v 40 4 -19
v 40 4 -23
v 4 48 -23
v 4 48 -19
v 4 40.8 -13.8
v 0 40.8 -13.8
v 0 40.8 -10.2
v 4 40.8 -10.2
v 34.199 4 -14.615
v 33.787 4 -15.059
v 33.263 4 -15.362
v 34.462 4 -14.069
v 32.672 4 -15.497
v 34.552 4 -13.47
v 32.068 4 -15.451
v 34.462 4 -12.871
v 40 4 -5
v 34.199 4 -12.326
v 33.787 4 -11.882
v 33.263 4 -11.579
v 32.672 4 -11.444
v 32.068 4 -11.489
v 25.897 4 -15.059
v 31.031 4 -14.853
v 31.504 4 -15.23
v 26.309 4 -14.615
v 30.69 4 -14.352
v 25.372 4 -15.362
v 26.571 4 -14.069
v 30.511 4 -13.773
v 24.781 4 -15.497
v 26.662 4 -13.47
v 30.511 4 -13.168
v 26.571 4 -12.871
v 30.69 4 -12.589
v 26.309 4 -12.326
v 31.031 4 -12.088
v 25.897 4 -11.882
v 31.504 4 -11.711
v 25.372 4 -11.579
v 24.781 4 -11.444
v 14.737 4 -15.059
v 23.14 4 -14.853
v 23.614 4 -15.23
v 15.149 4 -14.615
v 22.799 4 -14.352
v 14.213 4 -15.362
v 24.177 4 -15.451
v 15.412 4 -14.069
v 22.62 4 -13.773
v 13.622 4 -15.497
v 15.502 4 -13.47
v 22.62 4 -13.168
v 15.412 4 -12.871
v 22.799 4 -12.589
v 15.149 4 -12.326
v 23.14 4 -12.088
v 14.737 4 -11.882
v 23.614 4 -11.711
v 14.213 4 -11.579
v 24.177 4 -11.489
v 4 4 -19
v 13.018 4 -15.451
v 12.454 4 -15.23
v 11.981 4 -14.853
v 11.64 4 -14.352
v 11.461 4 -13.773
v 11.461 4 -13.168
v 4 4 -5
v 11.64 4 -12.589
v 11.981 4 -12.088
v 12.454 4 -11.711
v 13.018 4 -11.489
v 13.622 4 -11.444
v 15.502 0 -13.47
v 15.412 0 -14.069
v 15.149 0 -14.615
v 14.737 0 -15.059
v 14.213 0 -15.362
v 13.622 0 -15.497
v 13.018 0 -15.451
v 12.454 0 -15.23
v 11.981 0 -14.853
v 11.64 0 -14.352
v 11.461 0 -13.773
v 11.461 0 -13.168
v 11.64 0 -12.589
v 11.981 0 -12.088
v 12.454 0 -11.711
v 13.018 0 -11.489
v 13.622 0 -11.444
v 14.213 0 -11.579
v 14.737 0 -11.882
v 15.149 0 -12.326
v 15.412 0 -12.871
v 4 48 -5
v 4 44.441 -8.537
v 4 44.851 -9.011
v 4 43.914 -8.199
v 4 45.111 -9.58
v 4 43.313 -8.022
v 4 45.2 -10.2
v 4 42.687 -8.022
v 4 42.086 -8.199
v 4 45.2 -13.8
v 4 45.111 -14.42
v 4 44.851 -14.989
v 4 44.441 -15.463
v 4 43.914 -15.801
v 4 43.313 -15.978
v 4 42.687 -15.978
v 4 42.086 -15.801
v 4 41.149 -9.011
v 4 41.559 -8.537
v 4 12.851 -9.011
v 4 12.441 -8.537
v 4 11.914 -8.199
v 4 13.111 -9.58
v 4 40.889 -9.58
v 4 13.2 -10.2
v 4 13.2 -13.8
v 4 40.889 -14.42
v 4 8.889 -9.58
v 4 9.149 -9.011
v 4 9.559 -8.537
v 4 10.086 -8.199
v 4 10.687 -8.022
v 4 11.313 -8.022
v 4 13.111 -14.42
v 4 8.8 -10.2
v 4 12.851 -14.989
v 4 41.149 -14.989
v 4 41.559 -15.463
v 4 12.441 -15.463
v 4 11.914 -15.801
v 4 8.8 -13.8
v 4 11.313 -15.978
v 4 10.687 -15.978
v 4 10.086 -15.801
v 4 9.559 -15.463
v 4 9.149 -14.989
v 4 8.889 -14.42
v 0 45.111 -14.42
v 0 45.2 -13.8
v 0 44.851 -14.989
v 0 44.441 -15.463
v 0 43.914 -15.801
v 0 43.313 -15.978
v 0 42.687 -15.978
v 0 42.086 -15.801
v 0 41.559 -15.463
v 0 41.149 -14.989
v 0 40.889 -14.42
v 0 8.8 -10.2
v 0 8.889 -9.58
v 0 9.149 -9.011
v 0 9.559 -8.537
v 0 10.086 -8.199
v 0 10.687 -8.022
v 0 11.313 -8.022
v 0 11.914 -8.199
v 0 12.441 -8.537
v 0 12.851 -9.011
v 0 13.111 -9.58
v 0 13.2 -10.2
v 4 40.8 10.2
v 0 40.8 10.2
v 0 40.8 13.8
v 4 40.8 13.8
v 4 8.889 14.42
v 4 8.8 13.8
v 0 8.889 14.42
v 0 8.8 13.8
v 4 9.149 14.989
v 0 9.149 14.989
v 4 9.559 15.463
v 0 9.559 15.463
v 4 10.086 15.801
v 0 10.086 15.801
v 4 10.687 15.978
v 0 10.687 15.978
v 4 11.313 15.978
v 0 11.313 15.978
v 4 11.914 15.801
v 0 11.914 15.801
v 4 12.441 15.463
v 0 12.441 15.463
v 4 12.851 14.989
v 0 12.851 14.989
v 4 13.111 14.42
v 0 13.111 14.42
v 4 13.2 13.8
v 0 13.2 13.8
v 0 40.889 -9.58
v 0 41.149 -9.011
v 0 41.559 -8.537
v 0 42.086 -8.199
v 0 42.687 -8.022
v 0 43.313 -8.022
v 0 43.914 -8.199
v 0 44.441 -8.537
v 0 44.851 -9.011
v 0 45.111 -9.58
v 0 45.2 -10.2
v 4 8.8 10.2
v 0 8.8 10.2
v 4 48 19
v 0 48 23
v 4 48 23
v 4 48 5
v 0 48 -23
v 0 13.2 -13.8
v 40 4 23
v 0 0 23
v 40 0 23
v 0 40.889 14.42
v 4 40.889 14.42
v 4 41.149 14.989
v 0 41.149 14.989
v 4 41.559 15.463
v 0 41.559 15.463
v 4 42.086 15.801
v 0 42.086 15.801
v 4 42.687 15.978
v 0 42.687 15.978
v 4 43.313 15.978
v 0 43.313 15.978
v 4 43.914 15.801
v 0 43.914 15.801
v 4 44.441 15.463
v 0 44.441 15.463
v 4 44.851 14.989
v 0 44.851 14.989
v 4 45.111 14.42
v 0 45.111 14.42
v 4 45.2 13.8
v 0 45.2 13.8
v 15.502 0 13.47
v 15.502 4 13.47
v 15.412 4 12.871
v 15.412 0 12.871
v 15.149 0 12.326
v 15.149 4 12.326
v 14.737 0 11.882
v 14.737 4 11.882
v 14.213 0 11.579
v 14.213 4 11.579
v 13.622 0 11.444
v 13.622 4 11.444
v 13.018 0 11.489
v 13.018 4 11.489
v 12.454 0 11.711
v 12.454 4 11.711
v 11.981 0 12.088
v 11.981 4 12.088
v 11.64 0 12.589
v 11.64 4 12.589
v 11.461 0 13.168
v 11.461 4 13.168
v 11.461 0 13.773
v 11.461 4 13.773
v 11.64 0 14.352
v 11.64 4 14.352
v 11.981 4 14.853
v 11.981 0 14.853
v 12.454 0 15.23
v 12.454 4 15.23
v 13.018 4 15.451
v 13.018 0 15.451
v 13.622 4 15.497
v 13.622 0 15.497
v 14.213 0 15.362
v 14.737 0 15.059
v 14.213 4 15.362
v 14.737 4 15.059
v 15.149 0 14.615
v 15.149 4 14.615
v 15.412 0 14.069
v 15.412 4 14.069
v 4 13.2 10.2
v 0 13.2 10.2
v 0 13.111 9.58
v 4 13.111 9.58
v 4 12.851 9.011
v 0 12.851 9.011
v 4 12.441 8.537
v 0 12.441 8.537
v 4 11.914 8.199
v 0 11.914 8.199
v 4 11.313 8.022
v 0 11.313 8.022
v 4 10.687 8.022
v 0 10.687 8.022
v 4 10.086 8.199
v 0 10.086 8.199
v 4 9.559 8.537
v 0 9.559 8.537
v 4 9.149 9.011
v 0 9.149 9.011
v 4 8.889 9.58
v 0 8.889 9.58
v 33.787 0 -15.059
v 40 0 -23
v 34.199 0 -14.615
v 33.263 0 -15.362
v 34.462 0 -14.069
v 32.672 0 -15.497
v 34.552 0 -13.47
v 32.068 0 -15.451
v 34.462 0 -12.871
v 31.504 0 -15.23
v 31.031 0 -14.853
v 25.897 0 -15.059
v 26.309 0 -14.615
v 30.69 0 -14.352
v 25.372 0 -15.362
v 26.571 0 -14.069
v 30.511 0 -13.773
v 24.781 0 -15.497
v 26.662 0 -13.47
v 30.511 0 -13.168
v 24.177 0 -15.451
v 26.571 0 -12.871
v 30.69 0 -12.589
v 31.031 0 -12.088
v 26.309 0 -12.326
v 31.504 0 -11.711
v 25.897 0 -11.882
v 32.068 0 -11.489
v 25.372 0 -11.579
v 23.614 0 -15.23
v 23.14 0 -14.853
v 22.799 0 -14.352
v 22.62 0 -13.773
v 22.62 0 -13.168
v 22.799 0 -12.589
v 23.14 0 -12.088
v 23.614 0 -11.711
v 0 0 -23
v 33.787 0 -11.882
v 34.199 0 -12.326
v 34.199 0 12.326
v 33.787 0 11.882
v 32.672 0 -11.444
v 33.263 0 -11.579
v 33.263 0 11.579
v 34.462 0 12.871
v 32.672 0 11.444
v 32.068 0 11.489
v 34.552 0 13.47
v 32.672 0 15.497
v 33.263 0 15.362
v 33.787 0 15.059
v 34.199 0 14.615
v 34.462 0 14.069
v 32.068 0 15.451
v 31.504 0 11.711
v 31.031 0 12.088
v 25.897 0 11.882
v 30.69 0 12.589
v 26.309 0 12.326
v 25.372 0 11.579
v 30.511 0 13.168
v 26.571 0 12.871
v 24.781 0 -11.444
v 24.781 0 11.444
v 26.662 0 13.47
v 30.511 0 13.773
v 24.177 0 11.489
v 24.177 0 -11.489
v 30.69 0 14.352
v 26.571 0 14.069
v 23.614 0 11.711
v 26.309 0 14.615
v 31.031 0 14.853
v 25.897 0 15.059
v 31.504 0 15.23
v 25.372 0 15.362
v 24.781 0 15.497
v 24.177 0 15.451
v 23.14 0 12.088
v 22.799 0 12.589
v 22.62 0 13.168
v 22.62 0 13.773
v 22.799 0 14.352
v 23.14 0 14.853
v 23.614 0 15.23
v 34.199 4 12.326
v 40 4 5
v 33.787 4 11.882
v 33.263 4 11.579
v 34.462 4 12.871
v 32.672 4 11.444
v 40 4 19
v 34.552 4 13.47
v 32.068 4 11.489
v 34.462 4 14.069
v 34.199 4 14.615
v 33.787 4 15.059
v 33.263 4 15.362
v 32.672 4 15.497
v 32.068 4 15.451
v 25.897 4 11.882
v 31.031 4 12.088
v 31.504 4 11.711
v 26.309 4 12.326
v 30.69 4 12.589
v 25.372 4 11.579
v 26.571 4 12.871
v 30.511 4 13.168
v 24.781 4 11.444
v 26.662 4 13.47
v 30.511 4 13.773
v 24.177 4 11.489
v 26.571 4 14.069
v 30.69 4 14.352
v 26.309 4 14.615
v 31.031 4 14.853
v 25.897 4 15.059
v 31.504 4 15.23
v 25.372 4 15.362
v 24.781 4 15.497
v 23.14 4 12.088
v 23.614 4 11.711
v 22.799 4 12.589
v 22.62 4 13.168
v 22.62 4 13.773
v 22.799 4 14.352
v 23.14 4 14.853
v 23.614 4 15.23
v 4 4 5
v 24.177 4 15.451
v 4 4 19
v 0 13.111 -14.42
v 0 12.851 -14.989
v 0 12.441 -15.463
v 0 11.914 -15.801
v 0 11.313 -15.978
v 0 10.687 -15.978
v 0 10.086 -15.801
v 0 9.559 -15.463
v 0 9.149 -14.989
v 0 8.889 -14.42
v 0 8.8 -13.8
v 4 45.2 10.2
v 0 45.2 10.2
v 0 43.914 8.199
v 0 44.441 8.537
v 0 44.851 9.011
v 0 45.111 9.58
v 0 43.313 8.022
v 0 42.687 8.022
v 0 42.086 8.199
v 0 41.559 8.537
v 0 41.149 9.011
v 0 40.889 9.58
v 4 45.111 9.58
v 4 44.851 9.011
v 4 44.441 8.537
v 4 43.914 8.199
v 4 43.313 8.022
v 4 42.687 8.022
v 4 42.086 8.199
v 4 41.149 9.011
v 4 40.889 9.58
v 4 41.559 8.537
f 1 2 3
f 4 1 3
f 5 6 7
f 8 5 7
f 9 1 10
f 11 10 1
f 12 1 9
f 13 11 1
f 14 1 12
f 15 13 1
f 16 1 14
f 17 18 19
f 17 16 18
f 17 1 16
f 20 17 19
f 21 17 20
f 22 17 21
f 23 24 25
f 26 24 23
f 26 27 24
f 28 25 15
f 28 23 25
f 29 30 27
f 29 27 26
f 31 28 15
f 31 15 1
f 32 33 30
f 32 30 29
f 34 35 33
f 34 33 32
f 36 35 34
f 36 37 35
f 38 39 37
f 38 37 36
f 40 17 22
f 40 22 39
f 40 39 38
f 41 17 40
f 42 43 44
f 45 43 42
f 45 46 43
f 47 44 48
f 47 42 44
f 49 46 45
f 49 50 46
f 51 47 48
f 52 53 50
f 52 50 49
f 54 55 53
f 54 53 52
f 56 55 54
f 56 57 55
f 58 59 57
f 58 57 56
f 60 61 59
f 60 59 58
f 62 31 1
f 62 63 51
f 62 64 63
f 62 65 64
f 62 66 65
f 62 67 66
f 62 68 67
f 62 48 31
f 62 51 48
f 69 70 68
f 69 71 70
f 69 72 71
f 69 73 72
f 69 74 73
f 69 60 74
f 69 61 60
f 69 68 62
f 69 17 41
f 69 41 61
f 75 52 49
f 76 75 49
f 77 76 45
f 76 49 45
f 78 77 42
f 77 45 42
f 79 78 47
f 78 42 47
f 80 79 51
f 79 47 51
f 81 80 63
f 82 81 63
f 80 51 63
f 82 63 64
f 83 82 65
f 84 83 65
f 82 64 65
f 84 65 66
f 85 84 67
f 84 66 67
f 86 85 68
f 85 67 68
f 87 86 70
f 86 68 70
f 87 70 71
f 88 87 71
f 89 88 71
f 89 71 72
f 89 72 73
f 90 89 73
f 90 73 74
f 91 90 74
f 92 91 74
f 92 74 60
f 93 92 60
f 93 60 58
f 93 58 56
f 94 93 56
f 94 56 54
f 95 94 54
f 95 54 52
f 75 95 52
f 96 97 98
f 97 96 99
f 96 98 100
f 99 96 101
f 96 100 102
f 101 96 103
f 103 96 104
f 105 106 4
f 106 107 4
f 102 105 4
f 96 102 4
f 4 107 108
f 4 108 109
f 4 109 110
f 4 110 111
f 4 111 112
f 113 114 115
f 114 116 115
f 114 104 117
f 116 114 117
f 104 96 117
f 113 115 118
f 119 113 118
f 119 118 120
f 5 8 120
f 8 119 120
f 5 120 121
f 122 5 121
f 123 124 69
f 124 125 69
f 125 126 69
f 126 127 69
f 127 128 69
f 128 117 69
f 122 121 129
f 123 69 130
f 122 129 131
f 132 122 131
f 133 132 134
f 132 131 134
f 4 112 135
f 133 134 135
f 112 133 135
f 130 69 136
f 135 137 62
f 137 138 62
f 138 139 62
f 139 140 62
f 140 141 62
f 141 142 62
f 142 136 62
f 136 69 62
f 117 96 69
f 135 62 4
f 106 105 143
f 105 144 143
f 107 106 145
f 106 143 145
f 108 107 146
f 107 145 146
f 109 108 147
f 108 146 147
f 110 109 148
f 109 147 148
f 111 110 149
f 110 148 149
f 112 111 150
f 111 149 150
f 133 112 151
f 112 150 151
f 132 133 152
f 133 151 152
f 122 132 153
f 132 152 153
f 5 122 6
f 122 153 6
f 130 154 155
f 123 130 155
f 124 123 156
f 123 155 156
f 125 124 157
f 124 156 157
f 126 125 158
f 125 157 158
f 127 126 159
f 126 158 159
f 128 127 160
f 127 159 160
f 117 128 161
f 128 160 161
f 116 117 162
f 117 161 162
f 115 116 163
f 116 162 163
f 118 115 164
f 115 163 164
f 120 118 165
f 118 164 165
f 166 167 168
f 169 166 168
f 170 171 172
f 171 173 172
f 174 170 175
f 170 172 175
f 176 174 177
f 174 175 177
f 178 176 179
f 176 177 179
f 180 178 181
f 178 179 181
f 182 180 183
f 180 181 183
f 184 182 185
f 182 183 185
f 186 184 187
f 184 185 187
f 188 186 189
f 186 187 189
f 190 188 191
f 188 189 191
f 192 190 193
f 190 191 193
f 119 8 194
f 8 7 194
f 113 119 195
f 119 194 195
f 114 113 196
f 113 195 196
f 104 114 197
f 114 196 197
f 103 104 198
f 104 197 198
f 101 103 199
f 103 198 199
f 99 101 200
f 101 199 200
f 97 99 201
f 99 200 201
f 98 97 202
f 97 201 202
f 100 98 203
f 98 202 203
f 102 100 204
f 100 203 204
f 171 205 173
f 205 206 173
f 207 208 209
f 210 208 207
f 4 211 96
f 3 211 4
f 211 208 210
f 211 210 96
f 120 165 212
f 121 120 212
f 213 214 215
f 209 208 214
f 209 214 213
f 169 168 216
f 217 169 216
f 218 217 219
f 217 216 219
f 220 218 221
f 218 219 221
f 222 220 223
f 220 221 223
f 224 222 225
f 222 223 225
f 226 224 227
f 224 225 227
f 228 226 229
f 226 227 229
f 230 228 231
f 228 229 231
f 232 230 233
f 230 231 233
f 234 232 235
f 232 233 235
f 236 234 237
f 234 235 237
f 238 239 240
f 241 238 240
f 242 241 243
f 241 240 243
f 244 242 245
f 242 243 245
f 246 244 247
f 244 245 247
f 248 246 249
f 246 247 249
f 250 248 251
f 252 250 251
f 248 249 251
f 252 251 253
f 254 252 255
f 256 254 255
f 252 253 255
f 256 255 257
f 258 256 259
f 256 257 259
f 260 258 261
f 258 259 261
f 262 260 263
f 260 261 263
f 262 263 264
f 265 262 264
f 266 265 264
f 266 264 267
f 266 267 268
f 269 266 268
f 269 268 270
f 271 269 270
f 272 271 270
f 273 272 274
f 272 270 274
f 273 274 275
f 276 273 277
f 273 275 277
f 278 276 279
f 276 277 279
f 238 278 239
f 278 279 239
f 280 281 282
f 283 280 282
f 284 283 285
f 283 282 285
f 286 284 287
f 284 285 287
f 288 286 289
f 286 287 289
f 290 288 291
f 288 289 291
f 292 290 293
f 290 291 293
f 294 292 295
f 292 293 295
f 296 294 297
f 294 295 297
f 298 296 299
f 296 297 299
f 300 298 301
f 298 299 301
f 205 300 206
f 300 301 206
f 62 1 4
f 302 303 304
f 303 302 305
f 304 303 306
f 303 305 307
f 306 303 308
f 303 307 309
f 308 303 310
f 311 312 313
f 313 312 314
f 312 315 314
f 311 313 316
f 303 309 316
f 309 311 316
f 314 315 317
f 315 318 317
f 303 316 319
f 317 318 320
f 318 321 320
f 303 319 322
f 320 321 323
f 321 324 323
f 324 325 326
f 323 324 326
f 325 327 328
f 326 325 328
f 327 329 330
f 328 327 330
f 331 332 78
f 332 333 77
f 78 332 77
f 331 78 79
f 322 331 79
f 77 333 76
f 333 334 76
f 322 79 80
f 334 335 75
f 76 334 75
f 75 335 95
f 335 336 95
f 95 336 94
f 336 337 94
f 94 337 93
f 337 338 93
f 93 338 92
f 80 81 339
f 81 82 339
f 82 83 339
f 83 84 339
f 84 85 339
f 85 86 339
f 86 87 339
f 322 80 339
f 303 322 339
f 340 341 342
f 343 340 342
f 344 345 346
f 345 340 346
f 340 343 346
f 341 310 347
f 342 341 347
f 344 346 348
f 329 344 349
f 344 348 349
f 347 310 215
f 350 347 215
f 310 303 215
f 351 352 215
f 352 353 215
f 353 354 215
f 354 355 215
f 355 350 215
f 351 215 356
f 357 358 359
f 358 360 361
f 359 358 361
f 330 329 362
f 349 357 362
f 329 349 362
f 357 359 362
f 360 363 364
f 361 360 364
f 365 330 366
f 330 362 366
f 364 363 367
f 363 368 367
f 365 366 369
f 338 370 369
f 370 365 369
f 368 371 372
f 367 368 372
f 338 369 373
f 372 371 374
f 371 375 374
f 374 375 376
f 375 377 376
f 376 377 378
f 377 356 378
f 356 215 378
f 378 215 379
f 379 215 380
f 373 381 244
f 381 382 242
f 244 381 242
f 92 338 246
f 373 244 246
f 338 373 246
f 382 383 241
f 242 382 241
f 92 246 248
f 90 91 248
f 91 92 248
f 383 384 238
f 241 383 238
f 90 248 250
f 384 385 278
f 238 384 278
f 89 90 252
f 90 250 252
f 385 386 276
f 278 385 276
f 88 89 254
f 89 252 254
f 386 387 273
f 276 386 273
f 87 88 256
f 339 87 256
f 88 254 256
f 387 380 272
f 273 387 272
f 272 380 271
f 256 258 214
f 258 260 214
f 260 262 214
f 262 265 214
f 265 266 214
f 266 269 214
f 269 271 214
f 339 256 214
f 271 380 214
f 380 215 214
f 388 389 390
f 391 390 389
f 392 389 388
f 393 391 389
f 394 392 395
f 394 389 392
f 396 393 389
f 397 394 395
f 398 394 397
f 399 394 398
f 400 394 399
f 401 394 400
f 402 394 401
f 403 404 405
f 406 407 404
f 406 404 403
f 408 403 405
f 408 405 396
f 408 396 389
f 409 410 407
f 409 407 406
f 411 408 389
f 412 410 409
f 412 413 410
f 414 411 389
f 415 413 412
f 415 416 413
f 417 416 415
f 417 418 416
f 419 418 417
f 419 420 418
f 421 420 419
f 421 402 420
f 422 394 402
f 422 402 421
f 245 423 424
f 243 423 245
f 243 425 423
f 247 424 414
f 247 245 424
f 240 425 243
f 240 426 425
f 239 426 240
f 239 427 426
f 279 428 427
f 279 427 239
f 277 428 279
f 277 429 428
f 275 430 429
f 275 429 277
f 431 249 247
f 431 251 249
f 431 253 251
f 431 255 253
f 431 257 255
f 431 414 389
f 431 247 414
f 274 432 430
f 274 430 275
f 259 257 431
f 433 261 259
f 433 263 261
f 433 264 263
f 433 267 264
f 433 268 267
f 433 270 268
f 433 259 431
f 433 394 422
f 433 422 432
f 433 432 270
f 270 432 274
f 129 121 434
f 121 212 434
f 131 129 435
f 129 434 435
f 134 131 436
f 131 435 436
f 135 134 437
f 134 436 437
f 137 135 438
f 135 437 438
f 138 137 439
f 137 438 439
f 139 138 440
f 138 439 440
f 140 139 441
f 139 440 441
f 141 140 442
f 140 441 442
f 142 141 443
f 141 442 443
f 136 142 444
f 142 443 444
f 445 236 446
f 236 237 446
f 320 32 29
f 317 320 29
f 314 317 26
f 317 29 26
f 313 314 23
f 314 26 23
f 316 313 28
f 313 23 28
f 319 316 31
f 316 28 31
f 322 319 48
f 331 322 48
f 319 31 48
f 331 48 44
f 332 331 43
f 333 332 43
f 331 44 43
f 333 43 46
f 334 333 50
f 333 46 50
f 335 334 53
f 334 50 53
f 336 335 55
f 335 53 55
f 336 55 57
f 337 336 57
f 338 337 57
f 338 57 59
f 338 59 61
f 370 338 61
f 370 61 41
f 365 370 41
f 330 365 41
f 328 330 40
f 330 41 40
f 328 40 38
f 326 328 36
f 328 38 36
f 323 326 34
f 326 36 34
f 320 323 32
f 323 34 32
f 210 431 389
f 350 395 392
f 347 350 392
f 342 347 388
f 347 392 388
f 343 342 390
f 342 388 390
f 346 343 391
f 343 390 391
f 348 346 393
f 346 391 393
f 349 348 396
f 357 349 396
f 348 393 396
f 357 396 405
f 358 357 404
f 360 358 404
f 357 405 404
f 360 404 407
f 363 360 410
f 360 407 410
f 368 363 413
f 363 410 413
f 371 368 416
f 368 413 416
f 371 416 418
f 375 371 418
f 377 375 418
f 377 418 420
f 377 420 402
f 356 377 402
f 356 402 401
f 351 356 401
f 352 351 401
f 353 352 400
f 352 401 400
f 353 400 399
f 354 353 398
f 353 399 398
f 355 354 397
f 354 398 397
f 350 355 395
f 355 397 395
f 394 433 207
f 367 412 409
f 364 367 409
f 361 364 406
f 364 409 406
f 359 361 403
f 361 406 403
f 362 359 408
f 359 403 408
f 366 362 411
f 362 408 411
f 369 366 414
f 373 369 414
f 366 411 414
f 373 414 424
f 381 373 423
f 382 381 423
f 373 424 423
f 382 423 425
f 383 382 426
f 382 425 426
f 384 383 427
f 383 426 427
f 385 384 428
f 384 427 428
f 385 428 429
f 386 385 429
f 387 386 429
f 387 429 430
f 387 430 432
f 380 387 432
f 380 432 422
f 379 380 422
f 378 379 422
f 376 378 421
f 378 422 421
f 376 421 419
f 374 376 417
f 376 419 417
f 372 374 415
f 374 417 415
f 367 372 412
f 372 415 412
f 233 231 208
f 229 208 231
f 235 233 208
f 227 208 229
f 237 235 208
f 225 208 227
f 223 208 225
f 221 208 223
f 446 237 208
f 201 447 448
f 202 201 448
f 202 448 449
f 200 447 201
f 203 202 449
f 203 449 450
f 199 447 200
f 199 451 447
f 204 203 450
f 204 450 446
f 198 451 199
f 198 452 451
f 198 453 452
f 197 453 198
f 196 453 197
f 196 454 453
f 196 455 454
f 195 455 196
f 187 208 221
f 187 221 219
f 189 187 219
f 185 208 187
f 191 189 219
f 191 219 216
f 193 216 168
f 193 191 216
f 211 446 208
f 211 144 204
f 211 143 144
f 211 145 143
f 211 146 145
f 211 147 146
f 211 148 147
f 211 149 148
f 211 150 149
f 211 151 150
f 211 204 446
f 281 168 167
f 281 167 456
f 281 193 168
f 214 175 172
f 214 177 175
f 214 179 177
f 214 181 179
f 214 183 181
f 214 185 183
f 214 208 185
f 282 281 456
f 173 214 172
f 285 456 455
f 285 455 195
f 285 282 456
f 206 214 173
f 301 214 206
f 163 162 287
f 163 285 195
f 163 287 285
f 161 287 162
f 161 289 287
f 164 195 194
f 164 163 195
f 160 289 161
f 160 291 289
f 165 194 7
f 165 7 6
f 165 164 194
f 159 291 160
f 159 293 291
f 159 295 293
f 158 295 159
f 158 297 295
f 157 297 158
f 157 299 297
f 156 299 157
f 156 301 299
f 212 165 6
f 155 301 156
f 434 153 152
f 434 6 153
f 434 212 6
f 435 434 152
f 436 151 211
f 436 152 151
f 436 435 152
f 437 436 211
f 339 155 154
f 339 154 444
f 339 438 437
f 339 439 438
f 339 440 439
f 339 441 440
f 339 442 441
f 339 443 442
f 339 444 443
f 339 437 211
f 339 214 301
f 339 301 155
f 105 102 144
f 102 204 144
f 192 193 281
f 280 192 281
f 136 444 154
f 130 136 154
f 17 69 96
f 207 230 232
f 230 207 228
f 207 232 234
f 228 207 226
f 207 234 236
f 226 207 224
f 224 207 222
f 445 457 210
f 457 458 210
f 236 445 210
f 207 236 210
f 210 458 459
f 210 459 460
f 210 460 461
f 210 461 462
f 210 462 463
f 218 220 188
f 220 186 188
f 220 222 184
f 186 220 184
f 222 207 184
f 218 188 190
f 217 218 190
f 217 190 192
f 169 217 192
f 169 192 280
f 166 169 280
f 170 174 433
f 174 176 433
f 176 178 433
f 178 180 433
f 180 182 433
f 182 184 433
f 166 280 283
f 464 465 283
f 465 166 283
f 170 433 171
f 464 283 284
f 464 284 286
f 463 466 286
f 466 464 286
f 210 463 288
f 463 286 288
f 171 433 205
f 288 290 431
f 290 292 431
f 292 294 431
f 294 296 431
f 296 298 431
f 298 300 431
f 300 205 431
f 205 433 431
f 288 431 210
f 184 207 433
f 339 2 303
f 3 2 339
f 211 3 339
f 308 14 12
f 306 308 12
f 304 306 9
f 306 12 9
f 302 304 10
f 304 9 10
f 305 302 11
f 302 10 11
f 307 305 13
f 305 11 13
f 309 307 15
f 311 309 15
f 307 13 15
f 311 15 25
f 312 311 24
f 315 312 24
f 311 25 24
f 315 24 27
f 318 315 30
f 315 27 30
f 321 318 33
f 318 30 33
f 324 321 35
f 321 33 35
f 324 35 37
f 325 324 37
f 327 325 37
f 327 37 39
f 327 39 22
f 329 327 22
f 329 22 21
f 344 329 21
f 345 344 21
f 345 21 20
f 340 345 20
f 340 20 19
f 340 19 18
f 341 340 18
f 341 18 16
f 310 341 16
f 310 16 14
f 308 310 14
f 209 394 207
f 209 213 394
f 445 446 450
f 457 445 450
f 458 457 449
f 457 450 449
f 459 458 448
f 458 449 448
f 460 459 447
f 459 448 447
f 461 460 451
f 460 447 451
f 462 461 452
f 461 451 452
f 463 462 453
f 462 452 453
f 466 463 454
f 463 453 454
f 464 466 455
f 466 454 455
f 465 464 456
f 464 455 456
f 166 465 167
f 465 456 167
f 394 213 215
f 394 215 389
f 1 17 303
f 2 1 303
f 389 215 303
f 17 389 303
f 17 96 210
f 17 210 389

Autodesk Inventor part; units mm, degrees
ref_plane "YZ Plane" through (0, 0, 0) normal (1, 0, 0) x (0, 1, 0)
ref_plane "XZ Plane" through (0, 0, 0) normal (0, 1, 0) x (-1, 0, 0)
sketch "Sketch1" plane through (0, 0, 0) normal (0, 1, 0) x (-1, 0, 0)
  line L0 (-40, -23) -> (0, -23)
  line L1 (-40, 23) -> (0, 23)
  line L2 (0, 23) -> (0, -23)
  line L3 (-40, 23) -> (-40, -23)
  line L4 (-40, -12) -> (0, -12) construction
  line L5 (-40, 12) -> (0, 12) construction
  line L6 (-4, 23) -> (-4, -23) construction
  circle A0 centre (-9.5, 12) radius 3.5 construction
  line L7 (0, 19) -> (-40, 19) construction
  point P0 (0, 0)
  dimension "d5" = 46
  dimension "d6" = 23
  dimension "d7" = 40
  dimension "d8" = 0
  dimension "d9" = 12
  dimension "d10" = 12
  dimension "d12" = 4
  dimension "d22" = 7
  dimension "d23" = 4
extrude "Lift Attachment Plate" add sketch "Sketch1" along normal blind 4
sketch "Sketch2" plane through (0, 4, 0) normal (0, 1, 0) x (1, 0, 0)
  line L0 (0, 23) -> (0, -23) projected
  line L1 (40, 23) -> (0, 23) projected
  line L2 (0, -23) -> (4, -23)
  line L3 (4, -23) -> (4, 23)
  line L4 (4, 23) -> (0, 23)
  line L5 (0, 23) -> (0, -23)
  point P0 (0, 0)
  dimension "d26" = 4
extrude "Cross bar Attachment Plate" add sketch "Sketch2" along normal blind 44
sketch "Sketch3" plane through (0, 0, 23) normal (0, 0, 1) x (1, 0, 0)
  line L0 (4, 4) -> (4, 48) projected
  line L1 (4, 48) -> (4, 4)
  line L2 (40, 4) -> (4, 4) projected
  line L3 (4, 4) -> (40, 4)
  line L4 (40, 4) -> (4, 48)
  point P0 (0, 0)
extrude "Left bracket" add sketch "Sketch3" against normal blind 4
sketch "Sketch4" plane through (0, 0, 0) normal (0, 0, 1) x (1, 0, 0)
  line L0 (4, 48) -> (40, 4) projected
  line L1 (4, 4) -> (40, 4) projected
  line L2 (4, 48) -> (4, 4)
  line L3 (4, 4) -> (40, 4)
  line L4 (40, 4) -> (4, 48)
  point P0 (0, 0)
extrude "Center bracket" add sketch "Sketch4" along normal mid plane 10
sketch "Sketch5" plane through (40, 0, -23) normal (0, 0, -1) x (-1, 0, 0)
  line L0 (36, 48) -> (40, 48) projected
  line L1 (36, 48) -> (36, 4) projected
  line L2 (36, 48) -> (36, 4)
  line L3 (0, 4) -> (36, 4) projected
  line L4 (36, 4) -> (0, 4)
  line L5 (0, 4) -> (36, 48)
  point P0 (40, 0)
extrude "Right bracket" add sketch "Sketch5" against normal blind 4
sketch "Sketch6" plane through (0, 0, -23) normal (-1, 0, 0) x (0, 0, 1)
  circle A0 centre (35, 11) radius 2 construction
  circle A1 centre (11, 11) radius 2 construction
  line L0 (0, 0) -> (46, 0) construction
  line L1 (23, 57.6) -> (23, -9.6) construction
  circle A2 centre (35, 43) radius 2 construction
  circle A3 centre (11, 43) radius 2 construction
  line L2 (42, 48) -> (42, 4) construction
  line L3 (4, 4) -> (4, 48) construction
  line L4 (15, 11) -> (7, 11) construction
  line L5 (4, 4) -> (4, 48) projected
  line L6 (12.8, 13.2) -> (9.2, 13.2)
  line L7 (9.2, 8.8) -> (12.8, 8.8)
  arc A4 (12.8, 8.8) -> (12.8, 13.2) centre (12.8, 11) ccw
  arc A5 (9.2, 13.2) -> (9.2, 8.8) centre (9.2, 11) ccw
  point P0 (23, 0)
  dimension "d35" = 4
  dimension "d36" = 4
  dimension "d37" = 11
  dimension "d38" = 11
  dimension "d39" = 12
  dimension "d40" = 12
  dimension "d41" = 4
  dimension "d42" = 4
  dimension "d43" = 32
  dimension "d44" = 32
  dimension "d45" = 4
  dimension "d46" = 4
  dimension "d47" = 4.4
extrude "Extrusion6" cut sketch "Sketch6" against normal through all
pattern_linear "Rectangular Pattern1" count 2 spacing 24 along (0, 0, 1) count 2 spacing 32 along (0, 1, 0) of "Extrusion6"
sketch "Sketch7" plane through (0, 4, 0) normal (0, 1, 0) x (1, 0, 0)
  circle A0 centre (13.4704, -13.4704) radius 1.778 construction
  circle A1 centre (24.6296, -13.4704) radius 1.778 construction
  circle A2 centre (32.5204, -13.4704) radius 1.778 construction
  circle A3 centre (24.6296, 13.4704) radius 1.778 construction
  circle A4 centre (13.4704, 13.4704) radius 1.778 construction
  circle A5 centre (32.5204, 13.4704) radius 1.778 construction
  circle A6 centre (13.4704, -13.4704) radius 2.032
  circle A7 centre (24.6296, -13.4704) radius 2.032
  circle A8 centre (32.5204, -13.4704) radius 2.032
  circle A9 centre (13.4704, 13.4704) radius 2.032
  circle A10 centre (24.6296, 13.4704) radius 2.032
  circle A11 centre (32.5204, 13.4704) radius 2.032
  point P0 (0, 0)
  dimension "d56" = 4.064
  dimension "d57" = 4.064
  dimension "d58" = 4.064
  dimension "d59" = 4.064
  dimension "d60" = 4.064
  dimension "d61" = 4.064
extrude "Extrusion7" cut sketch "Sketch7" against normal blind 10
equation "\"d6\" = 0.5 * d5"
equation "\"d10\" = d9"
equation "\"d38\" = d37"
equation "\"d39\" = d40"
equation "\"d44\" = d43"
equation "\"d46\" = d45"
properties part number "Cross bar bracket actobotics"
